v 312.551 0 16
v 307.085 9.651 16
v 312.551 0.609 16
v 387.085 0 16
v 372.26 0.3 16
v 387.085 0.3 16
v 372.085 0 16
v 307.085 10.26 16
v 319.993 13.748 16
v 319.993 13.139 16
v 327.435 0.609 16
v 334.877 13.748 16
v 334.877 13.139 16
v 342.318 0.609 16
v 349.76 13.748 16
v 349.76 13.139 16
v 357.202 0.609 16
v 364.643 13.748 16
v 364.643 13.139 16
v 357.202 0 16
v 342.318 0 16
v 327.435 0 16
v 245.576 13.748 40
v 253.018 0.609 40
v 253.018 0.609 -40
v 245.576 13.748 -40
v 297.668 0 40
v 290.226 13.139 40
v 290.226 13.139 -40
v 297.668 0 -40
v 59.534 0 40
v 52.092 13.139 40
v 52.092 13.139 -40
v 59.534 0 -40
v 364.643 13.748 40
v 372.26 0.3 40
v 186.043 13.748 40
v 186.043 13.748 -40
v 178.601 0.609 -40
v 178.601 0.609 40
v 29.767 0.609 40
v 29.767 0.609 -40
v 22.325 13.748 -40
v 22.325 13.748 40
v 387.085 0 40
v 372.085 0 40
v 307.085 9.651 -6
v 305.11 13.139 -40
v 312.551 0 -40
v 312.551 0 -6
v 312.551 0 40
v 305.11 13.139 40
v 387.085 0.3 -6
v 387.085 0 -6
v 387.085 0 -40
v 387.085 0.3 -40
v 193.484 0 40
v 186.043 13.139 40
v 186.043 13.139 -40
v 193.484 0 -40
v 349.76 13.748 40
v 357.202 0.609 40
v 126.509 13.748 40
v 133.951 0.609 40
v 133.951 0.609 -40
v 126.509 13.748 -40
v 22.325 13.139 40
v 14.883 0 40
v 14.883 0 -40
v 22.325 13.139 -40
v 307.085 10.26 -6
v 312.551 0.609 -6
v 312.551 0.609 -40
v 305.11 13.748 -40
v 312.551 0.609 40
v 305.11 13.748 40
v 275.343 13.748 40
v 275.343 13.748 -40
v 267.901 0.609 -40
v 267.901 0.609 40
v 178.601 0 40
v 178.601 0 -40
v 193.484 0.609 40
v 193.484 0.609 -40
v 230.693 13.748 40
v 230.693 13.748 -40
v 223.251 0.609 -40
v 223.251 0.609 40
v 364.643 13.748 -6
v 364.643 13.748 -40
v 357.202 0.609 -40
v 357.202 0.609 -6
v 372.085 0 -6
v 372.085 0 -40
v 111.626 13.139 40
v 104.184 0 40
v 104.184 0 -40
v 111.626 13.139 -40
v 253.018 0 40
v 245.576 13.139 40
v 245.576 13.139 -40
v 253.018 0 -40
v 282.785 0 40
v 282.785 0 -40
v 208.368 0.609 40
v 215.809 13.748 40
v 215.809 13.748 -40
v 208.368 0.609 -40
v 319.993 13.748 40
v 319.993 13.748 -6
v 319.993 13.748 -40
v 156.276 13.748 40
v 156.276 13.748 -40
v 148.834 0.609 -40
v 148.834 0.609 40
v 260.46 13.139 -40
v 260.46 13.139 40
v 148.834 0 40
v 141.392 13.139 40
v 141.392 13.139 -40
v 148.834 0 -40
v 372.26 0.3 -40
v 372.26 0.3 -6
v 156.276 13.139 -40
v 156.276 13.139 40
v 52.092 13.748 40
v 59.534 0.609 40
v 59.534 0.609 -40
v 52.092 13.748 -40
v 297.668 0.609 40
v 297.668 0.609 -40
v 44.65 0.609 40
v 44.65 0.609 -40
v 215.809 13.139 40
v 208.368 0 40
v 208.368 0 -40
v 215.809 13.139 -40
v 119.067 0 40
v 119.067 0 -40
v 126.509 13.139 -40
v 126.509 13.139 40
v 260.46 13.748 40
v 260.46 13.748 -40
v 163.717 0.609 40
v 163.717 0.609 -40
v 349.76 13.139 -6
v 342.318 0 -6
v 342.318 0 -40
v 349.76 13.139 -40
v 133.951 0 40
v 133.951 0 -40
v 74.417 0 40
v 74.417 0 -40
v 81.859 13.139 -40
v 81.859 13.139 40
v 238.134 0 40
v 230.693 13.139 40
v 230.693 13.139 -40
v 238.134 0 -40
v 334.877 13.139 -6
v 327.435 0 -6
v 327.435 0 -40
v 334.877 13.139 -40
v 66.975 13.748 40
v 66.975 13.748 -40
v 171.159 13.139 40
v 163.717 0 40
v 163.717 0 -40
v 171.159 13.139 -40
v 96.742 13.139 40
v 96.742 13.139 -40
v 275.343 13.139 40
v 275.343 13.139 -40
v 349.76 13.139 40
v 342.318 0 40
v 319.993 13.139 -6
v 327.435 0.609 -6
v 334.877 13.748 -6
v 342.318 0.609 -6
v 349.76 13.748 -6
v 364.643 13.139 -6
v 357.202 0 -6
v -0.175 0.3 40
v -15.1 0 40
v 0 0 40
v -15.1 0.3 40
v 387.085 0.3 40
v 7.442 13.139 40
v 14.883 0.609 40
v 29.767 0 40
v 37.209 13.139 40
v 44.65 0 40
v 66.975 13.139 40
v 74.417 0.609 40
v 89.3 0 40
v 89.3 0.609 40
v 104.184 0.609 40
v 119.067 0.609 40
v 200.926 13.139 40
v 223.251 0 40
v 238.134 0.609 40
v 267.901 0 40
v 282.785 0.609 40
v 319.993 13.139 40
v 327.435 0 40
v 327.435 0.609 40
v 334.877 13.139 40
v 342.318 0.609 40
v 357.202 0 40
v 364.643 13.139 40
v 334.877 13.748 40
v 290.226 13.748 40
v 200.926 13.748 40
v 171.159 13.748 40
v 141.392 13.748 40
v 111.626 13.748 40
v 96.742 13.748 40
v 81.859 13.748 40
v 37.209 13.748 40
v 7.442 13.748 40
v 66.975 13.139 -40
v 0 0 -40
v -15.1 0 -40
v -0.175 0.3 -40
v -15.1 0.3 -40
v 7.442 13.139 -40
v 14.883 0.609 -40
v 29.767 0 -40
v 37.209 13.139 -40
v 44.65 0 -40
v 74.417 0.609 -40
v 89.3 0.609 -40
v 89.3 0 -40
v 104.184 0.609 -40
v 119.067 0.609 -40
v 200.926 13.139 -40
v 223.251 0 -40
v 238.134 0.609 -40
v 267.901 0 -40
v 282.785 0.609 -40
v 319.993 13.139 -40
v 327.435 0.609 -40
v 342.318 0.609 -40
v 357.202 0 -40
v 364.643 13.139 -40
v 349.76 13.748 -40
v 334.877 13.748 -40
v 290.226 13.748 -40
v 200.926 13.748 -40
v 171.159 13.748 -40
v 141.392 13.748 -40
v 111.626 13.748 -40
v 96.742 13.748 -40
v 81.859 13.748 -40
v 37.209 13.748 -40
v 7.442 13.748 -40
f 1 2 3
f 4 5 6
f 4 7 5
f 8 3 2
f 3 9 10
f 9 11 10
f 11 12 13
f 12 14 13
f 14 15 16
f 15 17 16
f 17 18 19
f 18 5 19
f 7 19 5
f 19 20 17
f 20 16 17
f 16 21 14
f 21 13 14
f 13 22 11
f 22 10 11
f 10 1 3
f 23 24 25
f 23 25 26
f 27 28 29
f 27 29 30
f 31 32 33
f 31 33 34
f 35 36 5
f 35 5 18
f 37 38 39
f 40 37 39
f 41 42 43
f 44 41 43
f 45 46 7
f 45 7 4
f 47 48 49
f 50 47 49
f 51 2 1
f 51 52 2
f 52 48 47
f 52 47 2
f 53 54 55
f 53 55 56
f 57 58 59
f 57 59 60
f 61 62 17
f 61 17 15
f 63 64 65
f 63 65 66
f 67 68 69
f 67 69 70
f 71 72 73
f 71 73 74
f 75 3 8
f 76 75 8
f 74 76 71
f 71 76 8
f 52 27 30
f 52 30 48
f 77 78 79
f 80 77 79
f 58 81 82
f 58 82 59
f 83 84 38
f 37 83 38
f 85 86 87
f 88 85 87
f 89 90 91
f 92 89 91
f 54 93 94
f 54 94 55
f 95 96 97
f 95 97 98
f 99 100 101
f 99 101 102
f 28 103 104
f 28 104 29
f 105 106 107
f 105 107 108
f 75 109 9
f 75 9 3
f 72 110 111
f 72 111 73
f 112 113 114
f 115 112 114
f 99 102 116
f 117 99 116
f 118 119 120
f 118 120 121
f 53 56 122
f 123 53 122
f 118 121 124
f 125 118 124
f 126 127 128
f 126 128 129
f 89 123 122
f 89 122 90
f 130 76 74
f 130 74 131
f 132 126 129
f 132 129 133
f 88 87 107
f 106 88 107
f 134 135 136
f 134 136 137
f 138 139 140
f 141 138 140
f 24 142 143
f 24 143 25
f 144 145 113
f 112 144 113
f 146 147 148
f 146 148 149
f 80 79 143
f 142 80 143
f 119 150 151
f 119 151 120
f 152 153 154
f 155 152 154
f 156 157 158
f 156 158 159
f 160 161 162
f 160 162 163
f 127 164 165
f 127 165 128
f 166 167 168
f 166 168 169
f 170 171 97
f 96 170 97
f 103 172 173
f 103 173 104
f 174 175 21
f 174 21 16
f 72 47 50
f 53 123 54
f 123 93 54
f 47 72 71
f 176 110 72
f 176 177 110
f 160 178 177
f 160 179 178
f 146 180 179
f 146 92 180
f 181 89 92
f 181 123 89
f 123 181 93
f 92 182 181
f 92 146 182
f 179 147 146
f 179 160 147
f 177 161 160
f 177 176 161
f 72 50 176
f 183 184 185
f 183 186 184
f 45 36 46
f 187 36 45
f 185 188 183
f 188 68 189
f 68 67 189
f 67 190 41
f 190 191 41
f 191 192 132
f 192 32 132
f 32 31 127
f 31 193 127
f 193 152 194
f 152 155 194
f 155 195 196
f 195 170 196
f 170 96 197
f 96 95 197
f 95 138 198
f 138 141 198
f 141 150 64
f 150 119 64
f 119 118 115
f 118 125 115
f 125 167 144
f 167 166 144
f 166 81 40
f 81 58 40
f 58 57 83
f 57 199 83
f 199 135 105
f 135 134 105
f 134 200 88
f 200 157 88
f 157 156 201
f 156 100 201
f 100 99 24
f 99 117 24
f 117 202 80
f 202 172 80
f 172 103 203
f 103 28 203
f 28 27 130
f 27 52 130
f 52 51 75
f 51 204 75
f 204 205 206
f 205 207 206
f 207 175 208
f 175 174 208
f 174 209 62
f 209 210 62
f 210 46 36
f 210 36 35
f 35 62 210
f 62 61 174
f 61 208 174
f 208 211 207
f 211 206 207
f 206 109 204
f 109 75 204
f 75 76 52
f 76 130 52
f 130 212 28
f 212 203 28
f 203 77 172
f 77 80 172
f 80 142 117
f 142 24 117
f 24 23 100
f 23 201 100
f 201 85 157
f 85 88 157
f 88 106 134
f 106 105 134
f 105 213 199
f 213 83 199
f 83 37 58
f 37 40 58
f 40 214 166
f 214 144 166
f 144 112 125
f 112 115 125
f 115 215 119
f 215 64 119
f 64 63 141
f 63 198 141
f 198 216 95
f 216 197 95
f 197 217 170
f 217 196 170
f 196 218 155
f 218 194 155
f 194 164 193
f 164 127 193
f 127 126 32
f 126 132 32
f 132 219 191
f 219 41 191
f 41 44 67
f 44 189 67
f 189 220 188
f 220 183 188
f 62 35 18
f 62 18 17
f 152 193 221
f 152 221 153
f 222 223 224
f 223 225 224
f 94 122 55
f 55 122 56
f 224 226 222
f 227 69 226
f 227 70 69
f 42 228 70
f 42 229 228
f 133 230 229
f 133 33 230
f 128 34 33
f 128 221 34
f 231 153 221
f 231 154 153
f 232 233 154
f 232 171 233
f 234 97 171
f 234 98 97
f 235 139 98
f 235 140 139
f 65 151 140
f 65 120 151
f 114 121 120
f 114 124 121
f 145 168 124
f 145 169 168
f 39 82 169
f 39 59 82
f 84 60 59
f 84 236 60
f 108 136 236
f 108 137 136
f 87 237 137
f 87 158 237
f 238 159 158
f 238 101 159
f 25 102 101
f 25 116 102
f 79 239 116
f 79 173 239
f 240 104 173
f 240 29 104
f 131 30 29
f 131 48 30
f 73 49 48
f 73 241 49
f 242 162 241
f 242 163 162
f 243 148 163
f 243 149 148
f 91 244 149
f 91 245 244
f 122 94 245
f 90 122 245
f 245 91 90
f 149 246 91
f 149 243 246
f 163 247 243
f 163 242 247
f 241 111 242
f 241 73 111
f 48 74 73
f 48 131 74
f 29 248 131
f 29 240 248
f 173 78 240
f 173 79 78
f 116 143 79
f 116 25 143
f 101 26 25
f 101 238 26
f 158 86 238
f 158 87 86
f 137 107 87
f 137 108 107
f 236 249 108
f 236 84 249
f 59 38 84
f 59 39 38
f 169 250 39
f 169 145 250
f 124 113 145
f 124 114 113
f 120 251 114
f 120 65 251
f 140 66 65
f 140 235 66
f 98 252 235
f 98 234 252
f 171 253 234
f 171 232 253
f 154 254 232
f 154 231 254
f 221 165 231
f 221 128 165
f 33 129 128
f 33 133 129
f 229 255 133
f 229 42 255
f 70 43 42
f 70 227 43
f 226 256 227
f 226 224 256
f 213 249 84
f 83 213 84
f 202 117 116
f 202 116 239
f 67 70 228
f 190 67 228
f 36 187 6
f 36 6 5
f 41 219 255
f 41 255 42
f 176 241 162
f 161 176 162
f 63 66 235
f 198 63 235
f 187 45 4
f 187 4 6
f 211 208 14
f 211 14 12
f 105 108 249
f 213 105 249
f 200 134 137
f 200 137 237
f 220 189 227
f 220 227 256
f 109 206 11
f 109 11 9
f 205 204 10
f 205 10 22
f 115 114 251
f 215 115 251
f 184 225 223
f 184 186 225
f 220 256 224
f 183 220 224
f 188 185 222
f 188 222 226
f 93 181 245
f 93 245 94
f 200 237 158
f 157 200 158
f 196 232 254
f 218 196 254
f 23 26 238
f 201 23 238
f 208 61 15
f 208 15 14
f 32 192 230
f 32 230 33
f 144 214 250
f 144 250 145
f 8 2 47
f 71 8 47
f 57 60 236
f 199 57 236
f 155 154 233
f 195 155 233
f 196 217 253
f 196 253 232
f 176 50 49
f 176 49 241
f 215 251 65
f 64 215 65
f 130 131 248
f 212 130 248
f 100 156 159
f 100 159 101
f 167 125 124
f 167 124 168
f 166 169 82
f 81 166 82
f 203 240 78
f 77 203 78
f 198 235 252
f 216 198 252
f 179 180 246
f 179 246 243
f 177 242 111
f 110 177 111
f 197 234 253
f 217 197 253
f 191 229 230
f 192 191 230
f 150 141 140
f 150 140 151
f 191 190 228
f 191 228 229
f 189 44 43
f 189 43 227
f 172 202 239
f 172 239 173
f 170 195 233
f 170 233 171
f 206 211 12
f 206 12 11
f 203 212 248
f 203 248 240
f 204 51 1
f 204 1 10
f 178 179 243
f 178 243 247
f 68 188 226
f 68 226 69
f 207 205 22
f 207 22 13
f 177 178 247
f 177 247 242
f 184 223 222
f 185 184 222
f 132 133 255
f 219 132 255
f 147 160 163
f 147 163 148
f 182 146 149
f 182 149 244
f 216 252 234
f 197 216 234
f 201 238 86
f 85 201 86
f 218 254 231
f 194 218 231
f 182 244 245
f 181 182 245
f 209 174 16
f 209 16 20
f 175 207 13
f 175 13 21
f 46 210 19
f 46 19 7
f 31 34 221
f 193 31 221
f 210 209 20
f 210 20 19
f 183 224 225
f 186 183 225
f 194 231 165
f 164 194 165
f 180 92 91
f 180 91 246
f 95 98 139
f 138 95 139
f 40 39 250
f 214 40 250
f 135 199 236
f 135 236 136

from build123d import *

# Parameters (mm, degrees)
EXTRUDE_THIN1_DEPTH     = 40
CUT_EXTRUDE4_DEPTH      = 390.389022579
CUT_EXTRUDE4_DEPTH_BACK = 390.389022579
SKETCH2_W               = 80
SKETCH2_H               = 22


with BuildPart() as part:
    # Sketch1 → Extrude-Thin1 (new, symmetric)
    with BuildSketch(Plane.XY):
        Polygon((-15.1, 0), (0, 0), (7.44170041, 13.13891529), (14.88340082, 0), (22.325101231, 13.13891529), (29.766801641, 0), (37.208502051, 13.13891529), (44.650202461, 0), (52.091902871, 13.13891529), (59.533603282, 0), (66.975303692, 13.13891529), (74.417004102, 0), (81.858704512, 13.13891529), (89.300404922, 0), (96.742105333, 13.13891529), (104.183805743, 0), (111.625506153, 13.13891529), (119.067206563, 0), (126.508906973, 13.13891529), (133.950607384, 0), (141.392307794, 13.13891529), (148.834008204, 0), (156.275708614, 13.13891529), (163.717409024, 0), (171.159109435, 13.13891529), (178.600809845, 0), (186.042510255, 13.13891529), (193.484210665, 0), (200.925911075, 13.13891529), (208.367611485, 0), (215.809311896, 13.13891529), (223.251012306, 0), (230.692712716, 13.13891529), (238.134413126, 0), (245.576113536, 13.13891529), (253.017813947, 0), (260.459514357, 13.13891529), (267.901214767, 0), (275.342915177, 13.13891529), (282.784615587, 0), (290.226315998, 13.13891529), (297.668016408, 0), (305.109716818, 13.13891529), (312.551417228, 0), (319.993117638, 13.13891529), (327.434818049, 0), (334.876518459, 13.13891529), (342.318218869, 0), (349.759919279, 13.13891529), (357.201619689, 0), (364.6433201, 13.13891529), (372.08502051, 0), (387.08502051, 0), (387.08502051, 0.3), (372.259881967, 0.3), (364.6433201, 13.747647132), (357.201619689, 0.608731842), (349.759919279, 13.747647132), (342.318218869, 0.608731842), (334.876518459, 13.747647132), (327.434818049, 0.608731842), (319.993117638, 13.747647132), (312.551417228, 0.608731842), (305.109716818, 13.747647132), (297.668016408, 0.608731842), (290.226315998, 13.747647132), (282.784615587, 0.608731842), (275.342915177, 13.747647132), (267.901214767, 0.608731842), (260.459514357, 13.747647132), (253.017813947, 0.608731842), (245.576113536, 13.747647132), (238.134413126, 0.608731842), (230.692712716, 13.747647132), (223.251012306, 0.608731842), (215.809311896, 13.747647132), (208.367611485, 0.608731842), (200.925911075, 13.747647132), (193.484210665, 0.608731842), (186.042510255, 13.747647132), (178.600809845, 0.608731842), (171.159109435, 13.747647132), (163.717409024, 0.608731842), (156.275708614, 13.747647132), (148.834008204, 0.608731842), (141.392307794, 13.747647132), (133.950607384, 0.608731842), (126.508906973, 13.747647132), (119.067206563, 0.608731842), (111.625506153, 13.747647132), (104.183805743, 0.608731842), (96.742105333, 13.747647132), (89.300404922, 0.608731842), (81.858704512, 13.747647132), (74.417004102, 0.608731842), (66.975303692, 13.747647132), (59.533603282, 0.608731842), (52.091902871, 13.747647132), (44.650202461, 0.608731842), (37.208502051, 13.747647132), (29.766801641, 0.608731842), (22.325101231, 13.747647132), (14.88340082, 0.608731842), (7.44170041, 13.747647132), (-0.174861457, 0.3), (-15.1, 0.3), align=None)
    extrude(amount=EXTRUDE_THIN1_DEPTH, both=True)

    # Sketch2 → Cut-Extrude4 (cut, two sides: drawn at the far end of the back side and taken through both)
    with BuildSketch(Plane(origin=(0, 0, 0), x_dir=(1, 0, 0), z_dir=(0, 1, 0)).offset(-CUT_EXTRUDE4_DEPTH_BACK)):
        with Locations((347.08502051, -5)):
            Rectangle(SKETCH2_W, SKETCH2_H)
    extrude(amount=CUT_EXTRUDE4_DEPTH + CUT_EXTRUDE4_DEPTH_BACK, mode=Mode.SUBTRACT)


solid = part.part
